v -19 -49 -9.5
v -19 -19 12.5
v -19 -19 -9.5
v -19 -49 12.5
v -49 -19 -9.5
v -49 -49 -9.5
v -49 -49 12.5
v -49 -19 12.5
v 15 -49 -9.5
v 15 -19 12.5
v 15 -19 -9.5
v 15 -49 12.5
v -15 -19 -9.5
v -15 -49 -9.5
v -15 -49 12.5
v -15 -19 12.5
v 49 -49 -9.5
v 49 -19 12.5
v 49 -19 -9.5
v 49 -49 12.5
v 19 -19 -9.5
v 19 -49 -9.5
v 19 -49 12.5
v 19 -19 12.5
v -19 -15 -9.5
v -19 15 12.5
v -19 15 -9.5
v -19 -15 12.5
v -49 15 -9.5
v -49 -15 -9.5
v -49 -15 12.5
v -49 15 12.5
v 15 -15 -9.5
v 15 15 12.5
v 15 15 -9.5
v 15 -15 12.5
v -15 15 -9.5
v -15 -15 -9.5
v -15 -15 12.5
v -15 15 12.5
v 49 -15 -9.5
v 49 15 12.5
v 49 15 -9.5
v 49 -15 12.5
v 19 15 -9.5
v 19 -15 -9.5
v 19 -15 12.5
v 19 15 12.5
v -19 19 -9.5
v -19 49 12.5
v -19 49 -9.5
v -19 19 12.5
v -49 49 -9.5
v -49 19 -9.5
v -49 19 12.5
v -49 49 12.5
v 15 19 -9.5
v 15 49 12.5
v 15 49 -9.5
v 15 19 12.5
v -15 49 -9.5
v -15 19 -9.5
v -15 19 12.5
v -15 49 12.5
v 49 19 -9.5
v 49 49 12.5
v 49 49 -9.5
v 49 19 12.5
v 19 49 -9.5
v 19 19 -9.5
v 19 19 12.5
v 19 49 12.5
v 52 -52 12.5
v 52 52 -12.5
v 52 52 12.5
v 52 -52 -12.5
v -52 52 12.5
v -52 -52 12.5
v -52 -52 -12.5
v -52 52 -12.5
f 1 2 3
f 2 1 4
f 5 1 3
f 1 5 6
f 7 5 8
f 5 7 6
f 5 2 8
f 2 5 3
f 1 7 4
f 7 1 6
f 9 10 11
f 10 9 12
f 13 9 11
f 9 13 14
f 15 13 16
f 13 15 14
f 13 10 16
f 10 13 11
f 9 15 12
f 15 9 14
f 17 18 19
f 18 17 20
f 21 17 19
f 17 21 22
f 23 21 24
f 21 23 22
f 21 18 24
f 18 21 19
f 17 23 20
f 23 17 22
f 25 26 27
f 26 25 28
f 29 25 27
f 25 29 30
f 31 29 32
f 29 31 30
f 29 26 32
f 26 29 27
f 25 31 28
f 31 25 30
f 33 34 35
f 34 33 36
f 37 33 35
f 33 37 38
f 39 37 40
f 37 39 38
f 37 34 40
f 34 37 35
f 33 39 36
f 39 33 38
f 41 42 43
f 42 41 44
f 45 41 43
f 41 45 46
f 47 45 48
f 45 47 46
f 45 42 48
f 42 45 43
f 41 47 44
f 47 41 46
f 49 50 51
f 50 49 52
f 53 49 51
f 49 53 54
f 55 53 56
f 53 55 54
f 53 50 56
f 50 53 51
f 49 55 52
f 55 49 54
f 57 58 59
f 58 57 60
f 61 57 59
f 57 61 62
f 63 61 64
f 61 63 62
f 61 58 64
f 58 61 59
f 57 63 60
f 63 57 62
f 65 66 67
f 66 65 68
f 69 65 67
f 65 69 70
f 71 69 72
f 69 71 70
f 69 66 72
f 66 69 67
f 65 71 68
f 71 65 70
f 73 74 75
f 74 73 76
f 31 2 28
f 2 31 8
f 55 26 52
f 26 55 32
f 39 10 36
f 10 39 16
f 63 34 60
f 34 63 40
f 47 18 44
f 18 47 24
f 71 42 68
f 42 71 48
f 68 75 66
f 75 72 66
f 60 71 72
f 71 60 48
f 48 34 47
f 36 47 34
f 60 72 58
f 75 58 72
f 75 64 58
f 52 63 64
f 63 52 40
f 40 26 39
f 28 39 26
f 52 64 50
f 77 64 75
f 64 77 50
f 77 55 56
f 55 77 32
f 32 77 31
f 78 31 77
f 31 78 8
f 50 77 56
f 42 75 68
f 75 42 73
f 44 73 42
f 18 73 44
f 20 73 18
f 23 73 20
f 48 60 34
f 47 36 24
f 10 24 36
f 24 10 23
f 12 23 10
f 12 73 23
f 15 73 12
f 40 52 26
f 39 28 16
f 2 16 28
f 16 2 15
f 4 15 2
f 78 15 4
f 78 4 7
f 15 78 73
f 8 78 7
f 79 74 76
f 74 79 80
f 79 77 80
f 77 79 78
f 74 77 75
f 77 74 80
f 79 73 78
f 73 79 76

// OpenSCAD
$fn = 32;

// ----------------------------------------------------------------------
// Pocket plate 104 x 104 x 25
// 3 x 3 pockets 30 mm square, 22 mm deep
// ----------------------------------------------------------------------

// --- parameters (mm) ---
thickness = 25;  // plate thickness
floor_t = 3;     // material left under each pocket
pocket = 30;     // pocket side length
pitch_x = 34;    // pocket pitch along X
pitch_y = 34;    // pocket pitch along Y
cols = 3;        // pockets per row
rows = 3;        // rows of pockets

// --- derived feature positions (mm) ---
depth = thickness - floor_t;        // = 22   pocket depth, down to the floor
span_x = (cols - 1) * pitch_x;      // = 68   distance between outer pockets
span_y = (rows - 1) * pitch_y;      // = 68   distance between outer pocket rows
origin_x = -span_x / 2;             // = -34   X of the first pocket
origin_y = -span_y / 2;             // = -34   Y of the first pocket
plate = [span_x + pocket + 6, span_y + pocket + 6, thickness];  // = [104, 104, 25]   overall size: pockets plus 3 mm of wall on each side
feature_centers = [
  [origin_x + 0 * pitch_x, origin_y + 0 * pitch_y],
  [origin_x + 1 * pitch_x, origin_y + 0 * pitch_y],
  [origin_x + 2 * pitch_x, origin_y + 0 * pitch_y],
  [origin_x + 0 * pitch_x, origin_y + 1 * pitch_y],
  [origin_x + 1 * pitch_x, origin_y + 1 * pitch_y],
  [origin_x + 2 * pitch_x, origin_y + 1 * pitch_y],
  [origin_x + 0 * pitch_x, origin_y + 2 * pitch_y],
  [origin_x + 1 * pitch_x, origin_y + 2 * pitch_y],
  [origin_x + 2 * pitch_x, origin_y + 2 * pitch_y]
];   // pocket centres, used verbatim by the cutter loop

// plate outline, then one pocket per centre in feature_centers
difference() {
  cube(plate, center = true);
  for (centre = feature_centers)
    translate([centre[0] - pocket / 2, centre[1] - pocket / 2, plate[2] / 2 - depth])
      cube([pocket, pocket, depth + 1]);  // centred on the declared pocket centre
}
